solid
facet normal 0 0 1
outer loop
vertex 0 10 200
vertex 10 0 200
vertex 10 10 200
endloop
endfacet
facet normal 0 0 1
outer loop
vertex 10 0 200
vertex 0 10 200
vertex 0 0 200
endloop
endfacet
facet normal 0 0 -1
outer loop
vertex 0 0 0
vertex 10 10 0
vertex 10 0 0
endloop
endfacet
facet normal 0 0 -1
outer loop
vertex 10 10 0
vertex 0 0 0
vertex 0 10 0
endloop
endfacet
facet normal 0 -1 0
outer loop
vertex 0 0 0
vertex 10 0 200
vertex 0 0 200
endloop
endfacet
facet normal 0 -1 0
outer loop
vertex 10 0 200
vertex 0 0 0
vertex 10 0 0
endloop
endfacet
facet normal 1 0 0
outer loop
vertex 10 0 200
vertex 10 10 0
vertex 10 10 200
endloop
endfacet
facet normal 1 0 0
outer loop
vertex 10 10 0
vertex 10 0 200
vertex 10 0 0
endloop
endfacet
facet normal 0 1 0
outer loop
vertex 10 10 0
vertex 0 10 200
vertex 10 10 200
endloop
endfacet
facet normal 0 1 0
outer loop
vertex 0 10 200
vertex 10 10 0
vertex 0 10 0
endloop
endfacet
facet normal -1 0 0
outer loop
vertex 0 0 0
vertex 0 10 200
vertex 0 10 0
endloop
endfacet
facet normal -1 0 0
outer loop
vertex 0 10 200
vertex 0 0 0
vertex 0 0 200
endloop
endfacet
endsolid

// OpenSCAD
// 单位默认是毫米 (mm)

$fa = 1;            // 细分角度
$fs = 0.5;          // 最小边长

cube([10, 10, 200], center = false);  // 底面位于 Z=0，顶面在 Z=200
